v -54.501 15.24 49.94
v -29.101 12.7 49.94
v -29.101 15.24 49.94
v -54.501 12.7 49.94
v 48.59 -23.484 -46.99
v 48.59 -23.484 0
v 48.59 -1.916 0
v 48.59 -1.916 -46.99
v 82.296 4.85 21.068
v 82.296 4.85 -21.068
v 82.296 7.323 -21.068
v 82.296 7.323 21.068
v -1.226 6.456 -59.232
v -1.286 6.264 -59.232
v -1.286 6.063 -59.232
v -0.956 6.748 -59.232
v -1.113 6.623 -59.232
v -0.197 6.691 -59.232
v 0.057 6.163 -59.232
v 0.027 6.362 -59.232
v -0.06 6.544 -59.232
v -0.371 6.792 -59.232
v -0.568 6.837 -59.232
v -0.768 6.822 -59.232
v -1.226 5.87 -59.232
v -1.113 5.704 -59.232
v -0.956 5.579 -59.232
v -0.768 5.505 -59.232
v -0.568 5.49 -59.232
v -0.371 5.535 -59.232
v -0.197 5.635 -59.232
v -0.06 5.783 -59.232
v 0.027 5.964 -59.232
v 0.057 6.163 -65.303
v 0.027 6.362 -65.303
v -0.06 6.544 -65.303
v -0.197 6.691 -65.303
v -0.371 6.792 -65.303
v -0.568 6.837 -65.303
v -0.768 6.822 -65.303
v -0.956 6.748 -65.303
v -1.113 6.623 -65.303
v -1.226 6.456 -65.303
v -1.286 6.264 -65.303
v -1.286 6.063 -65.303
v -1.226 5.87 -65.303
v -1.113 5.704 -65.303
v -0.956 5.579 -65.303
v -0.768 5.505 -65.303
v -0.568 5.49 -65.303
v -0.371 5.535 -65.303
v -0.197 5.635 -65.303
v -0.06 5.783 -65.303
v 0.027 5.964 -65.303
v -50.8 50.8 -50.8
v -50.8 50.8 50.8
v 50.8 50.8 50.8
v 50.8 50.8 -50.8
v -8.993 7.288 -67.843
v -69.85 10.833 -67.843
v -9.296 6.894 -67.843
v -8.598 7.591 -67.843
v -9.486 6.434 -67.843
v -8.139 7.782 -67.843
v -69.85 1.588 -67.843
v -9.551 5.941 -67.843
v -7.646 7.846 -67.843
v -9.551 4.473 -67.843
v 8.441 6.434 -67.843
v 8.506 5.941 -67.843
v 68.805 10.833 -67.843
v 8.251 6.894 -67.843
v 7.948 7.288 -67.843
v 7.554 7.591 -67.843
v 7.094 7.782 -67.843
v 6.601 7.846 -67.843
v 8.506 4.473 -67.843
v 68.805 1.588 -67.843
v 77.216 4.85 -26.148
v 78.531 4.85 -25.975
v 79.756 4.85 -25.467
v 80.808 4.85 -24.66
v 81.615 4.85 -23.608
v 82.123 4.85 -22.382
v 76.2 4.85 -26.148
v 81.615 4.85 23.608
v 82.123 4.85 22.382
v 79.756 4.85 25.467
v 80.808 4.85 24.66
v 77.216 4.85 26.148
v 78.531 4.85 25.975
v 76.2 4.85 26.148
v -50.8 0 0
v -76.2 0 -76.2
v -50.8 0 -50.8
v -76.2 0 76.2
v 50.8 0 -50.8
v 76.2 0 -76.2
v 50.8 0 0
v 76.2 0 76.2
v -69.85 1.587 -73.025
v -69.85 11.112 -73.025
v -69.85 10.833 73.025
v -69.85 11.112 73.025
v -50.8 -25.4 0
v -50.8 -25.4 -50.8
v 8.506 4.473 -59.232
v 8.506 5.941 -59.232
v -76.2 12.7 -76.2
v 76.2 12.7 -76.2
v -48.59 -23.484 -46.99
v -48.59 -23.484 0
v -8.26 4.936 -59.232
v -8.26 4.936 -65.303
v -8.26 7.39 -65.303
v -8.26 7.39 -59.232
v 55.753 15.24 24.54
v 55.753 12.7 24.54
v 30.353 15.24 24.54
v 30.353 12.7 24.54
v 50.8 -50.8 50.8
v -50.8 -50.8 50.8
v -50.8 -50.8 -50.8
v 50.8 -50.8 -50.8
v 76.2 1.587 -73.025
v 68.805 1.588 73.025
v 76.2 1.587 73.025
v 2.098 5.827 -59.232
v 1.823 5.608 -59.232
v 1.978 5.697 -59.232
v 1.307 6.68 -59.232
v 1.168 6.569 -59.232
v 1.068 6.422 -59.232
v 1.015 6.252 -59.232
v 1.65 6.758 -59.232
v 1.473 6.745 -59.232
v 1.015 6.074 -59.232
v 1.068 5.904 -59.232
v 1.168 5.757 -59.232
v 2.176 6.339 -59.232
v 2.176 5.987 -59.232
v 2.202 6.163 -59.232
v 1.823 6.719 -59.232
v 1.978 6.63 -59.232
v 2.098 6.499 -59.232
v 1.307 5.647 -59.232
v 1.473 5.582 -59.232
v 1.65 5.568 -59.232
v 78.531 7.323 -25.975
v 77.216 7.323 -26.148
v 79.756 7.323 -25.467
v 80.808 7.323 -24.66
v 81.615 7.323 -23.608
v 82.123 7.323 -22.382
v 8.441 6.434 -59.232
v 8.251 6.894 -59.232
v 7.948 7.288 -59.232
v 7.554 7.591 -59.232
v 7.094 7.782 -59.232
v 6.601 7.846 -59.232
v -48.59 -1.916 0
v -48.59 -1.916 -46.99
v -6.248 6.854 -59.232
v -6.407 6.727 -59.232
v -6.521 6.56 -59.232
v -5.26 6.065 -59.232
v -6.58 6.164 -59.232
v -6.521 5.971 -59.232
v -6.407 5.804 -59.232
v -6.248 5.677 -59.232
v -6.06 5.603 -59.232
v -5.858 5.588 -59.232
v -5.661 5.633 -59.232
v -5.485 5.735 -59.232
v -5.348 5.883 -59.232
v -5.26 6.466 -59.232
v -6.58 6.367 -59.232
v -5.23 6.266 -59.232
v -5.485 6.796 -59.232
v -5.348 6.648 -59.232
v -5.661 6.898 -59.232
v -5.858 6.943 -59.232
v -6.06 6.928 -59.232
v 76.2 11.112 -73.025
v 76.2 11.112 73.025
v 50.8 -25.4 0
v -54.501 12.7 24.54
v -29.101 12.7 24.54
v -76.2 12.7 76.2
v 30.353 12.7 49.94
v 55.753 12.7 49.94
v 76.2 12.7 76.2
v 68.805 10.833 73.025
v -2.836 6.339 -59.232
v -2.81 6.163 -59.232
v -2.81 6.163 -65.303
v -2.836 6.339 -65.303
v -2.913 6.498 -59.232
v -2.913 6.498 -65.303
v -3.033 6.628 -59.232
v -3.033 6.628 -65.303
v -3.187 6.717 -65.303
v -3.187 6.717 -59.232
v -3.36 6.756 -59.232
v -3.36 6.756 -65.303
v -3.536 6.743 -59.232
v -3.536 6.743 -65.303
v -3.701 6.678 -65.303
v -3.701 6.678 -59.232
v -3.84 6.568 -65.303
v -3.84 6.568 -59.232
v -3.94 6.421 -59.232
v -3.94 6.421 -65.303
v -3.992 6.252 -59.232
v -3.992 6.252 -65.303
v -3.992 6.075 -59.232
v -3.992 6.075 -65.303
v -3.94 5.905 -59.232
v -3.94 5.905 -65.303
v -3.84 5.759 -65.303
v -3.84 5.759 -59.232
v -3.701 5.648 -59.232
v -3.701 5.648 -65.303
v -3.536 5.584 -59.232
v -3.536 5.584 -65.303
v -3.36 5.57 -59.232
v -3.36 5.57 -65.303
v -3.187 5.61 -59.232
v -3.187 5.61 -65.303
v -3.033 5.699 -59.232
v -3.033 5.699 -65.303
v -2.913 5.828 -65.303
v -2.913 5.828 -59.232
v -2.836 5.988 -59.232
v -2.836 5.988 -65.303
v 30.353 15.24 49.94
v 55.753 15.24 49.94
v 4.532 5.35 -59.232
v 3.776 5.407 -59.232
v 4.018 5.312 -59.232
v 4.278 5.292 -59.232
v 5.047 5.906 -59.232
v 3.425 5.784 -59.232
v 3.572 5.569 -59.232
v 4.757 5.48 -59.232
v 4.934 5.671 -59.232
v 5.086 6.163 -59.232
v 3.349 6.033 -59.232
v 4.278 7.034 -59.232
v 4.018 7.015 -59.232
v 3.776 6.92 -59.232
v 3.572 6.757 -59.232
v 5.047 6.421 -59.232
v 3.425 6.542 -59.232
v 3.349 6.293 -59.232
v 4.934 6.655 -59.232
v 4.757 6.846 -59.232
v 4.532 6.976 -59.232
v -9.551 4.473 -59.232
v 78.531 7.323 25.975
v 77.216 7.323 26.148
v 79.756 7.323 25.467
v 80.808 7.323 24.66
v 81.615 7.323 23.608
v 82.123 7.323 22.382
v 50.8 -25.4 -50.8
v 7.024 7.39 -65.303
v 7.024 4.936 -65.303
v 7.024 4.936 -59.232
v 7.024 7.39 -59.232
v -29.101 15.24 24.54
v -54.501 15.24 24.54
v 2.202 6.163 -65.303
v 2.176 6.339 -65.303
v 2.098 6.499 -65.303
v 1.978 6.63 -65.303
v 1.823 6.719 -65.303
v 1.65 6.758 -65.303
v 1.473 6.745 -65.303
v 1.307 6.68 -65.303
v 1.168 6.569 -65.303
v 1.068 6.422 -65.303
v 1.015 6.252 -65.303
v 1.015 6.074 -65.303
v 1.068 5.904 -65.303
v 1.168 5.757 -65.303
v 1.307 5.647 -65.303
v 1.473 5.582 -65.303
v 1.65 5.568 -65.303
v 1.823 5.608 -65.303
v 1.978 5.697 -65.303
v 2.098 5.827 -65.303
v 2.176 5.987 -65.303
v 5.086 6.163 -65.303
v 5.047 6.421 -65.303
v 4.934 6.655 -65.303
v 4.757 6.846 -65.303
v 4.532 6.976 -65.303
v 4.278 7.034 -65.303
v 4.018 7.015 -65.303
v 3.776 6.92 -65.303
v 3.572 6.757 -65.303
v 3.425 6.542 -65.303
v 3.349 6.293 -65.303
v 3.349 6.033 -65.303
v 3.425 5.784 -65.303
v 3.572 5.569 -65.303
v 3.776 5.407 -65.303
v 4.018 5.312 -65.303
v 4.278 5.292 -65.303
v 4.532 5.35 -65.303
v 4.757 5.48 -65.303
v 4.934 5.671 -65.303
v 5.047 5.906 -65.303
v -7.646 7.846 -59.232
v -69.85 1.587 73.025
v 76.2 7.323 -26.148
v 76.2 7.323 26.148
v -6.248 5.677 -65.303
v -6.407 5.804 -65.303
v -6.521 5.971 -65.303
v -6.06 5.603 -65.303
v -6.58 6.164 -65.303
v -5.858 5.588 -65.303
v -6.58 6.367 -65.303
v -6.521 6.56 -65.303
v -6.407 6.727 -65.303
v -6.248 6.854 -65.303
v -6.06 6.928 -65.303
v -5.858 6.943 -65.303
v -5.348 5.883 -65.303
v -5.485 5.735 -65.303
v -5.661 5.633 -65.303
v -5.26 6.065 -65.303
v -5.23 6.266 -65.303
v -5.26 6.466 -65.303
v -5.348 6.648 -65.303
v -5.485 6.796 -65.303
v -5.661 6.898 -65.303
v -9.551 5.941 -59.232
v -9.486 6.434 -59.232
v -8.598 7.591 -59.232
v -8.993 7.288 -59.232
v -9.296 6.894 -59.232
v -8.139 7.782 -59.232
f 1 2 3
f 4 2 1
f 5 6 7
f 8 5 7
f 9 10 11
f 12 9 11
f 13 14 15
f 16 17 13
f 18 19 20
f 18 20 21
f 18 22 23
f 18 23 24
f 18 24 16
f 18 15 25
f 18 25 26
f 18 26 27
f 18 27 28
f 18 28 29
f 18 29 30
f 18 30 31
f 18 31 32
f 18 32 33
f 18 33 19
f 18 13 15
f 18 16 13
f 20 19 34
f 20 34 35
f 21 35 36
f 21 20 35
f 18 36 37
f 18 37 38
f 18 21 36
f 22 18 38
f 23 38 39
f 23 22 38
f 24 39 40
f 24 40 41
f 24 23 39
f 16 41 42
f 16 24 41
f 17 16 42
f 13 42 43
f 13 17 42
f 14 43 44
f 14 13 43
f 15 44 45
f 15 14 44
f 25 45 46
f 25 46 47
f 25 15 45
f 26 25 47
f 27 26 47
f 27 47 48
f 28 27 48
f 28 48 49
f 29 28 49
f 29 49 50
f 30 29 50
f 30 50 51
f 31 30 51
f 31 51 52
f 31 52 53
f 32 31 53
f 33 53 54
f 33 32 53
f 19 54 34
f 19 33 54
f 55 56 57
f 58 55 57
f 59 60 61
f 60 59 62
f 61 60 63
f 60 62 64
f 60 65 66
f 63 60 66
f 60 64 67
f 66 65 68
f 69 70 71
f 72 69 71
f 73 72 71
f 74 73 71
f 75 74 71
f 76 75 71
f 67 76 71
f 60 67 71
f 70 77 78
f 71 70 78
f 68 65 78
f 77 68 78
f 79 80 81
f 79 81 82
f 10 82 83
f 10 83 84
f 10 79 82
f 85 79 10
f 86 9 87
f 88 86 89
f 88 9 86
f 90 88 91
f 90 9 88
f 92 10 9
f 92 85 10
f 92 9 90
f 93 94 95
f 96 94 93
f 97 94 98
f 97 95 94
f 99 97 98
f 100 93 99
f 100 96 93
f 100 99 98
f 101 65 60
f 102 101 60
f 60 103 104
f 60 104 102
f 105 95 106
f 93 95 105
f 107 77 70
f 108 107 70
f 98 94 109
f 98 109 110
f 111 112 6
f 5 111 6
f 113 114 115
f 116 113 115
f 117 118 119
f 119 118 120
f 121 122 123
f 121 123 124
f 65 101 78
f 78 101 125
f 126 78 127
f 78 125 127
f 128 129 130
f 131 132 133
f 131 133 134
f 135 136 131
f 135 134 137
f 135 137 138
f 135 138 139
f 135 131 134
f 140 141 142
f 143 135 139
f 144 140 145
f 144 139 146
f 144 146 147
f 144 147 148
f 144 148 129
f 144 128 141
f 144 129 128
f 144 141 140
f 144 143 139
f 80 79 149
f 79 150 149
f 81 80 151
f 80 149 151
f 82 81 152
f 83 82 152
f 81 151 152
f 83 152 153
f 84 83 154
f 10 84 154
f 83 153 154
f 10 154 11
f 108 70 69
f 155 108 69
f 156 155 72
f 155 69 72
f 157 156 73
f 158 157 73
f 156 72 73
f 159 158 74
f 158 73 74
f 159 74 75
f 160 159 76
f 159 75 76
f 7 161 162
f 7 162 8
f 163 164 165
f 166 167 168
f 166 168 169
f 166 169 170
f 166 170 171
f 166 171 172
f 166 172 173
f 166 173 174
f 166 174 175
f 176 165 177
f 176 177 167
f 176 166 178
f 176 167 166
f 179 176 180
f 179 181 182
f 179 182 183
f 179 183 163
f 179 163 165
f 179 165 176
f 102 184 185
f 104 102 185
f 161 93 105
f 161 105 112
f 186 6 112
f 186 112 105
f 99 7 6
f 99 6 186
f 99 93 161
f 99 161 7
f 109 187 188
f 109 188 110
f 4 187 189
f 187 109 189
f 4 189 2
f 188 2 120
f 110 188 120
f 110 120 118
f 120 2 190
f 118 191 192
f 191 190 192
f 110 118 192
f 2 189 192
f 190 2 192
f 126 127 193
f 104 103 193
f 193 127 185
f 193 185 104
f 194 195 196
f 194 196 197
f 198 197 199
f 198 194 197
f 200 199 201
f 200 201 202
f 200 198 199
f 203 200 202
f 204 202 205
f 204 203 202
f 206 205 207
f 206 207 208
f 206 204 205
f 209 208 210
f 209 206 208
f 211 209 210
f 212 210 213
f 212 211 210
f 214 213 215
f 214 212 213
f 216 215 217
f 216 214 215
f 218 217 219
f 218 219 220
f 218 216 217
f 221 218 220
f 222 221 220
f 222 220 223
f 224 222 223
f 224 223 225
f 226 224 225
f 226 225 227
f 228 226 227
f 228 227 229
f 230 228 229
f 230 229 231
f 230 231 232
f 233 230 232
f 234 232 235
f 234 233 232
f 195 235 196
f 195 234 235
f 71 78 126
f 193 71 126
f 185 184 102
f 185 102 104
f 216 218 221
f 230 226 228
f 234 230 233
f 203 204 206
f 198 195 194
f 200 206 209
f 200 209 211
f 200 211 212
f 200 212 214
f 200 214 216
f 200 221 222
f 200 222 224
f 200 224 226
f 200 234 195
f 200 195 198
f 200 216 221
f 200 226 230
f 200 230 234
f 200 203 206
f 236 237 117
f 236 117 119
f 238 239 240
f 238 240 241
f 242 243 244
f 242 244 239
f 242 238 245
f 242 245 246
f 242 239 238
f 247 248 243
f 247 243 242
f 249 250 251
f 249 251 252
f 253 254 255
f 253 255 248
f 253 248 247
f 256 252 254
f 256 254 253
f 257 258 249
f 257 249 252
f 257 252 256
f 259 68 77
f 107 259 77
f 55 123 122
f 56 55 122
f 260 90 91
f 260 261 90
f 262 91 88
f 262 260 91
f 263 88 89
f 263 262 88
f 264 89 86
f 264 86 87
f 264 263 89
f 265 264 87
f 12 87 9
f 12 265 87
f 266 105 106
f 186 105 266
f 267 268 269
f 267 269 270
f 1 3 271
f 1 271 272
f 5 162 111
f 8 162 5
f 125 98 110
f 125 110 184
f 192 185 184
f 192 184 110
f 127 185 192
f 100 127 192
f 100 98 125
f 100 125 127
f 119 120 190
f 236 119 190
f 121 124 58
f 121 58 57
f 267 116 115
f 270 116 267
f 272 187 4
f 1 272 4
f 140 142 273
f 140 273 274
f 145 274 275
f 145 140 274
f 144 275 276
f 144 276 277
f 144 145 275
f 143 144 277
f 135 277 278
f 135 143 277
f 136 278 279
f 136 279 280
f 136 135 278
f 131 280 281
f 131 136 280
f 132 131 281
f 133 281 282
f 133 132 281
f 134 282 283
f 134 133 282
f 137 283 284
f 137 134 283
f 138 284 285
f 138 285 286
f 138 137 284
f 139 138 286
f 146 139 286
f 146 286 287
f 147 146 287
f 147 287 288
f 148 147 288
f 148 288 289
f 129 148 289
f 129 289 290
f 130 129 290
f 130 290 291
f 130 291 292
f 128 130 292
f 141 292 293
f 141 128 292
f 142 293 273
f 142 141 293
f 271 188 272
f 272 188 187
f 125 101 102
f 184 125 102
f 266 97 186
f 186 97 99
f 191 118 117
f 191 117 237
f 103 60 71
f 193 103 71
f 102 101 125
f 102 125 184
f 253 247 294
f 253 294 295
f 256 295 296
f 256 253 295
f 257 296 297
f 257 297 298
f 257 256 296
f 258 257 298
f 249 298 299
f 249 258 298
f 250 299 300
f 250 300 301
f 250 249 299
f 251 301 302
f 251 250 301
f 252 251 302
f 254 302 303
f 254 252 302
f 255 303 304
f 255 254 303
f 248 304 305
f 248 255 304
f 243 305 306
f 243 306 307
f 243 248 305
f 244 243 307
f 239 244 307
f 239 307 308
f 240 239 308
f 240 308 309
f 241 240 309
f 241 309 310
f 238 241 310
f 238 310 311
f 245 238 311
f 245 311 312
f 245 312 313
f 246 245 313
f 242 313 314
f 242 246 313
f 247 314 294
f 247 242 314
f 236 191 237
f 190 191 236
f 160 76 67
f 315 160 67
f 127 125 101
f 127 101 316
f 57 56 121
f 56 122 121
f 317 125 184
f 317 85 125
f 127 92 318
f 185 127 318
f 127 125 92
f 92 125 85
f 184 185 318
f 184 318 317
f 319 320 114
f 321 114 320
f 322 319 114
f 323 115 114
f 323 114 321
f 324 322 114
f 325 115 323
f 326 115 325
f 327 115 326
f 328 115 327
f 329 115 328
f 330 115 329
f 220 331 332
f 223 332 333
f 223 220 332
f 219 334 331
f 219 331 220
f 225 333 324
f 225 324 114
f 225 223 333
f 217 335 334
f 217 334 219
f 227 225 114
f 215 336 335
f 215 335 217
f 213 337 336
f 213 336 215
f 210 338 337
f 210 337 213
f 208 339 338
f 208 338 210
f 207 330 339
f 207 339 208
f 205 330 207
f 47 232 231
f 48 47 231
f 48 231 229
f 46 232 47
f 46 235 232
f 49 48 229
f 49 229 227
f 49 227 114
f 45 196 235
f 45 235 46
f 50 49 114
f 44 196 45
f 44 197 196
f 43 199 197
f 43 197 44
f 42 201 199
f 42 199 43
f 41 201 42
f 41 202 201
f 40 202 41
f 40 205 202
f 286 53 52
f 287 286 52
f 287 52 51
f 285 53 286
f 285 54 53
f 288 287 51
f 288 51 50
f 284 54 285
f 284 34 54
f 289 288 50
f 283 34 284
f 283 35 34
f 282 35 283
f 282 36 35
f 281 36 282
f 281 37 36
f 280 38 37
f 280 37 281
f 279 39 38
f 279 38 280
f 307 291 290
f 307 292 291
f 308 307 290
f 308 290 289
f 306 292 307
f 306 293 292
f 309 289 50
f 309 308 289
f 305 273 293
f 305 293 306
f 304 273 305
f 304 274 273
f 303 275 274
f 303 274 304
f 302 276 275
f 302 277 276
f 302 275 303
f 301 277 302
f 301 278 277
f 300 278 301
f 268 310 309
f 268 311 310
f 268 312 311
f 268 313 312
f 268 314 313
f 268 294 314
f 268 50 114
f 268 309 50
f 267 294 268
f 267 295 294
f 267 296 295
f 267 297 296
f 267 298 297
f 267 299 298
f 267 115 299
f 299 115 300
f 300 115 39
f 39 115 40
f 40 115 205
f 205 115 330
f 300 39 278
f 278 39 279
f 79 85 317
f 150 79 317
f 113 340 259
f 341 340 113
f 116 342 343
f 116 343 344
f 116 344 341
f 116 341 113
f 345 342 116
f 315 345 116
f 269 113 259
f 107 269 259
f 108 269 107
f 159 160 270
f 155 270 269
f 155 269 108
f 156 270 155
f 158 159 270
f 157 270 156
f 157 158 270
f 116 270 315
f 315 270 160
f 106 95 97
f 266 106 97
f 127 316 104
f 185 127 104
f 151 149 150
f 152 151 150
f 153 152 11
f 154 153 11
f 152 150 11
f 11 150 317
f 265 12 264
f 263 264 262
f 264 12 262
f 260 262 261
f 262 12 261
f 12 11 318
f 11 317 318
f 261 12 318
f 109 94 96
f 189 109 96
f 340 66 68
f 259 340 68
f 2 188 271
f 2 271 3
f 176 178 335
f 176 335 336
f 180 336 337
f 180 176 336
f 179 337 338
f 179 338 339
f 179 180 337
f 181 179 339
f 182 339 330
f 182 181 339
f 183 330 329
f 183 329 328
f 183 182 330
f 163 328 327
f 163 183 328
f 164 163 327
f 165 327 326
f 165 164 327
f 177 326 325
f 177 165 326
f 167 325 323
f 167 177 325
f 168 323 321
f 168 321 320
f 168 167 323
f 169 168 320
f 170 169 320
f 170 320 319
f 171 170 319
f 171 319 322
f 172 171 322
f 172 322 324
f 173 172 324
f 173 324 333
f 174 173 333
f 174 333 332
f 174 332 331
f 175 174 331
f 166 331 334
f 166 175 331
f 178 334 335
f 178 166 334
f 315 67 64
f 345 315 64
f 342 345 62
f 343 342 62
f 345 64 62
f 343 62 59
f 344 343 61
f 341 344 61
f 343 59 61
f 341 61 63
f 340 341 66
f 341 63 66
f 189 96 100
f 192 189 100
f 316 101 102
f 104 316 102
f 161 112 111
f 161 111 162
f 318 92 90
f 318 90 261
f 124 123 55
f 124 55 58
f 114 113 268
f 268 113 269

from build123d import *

# Parameters (mm, degrees)
F1_W      = 152.4
F1_H      = 152.4
F2_DEPTH  = 12.7
F3_W      = 25.4
F3_H      = 25.4
F4_DEPTH  = 2.54
F6_W      = 9.525
F6_H      = 146.05
F6_W_2    = 7.9
F6_H_2    = 142.3924
F7_DEPTH  = 146.05
F8_W      = 101.6
F8_H      = 50.8
F9_DEPTH  = 25.4
F10_W     = 97.179114
F10_H     = 21.567774
F11_DEPTH = 46.99
F12_DEPTH = 146.05
F13_W     = 138.655322
F13_H     = 140.86758
F14_DEPTH = 9.2456
F16_DEPTH = 8.6106
F17_W     = 15.284132
F17_H     = 2.453639
F17_R     = 0.679113
F17_R_2   = 0.594481
F17_R_3   = 0.675254
F17_R_4   = 0.596675
F17_R_5   = 0.873496
F18_DEPTH = 6.0706
F19_W     = 2.473427
F19_H     = 52.295324
F20_DEPTH = 6.096
F21_R     = 5.08
F22_W     = 101.6
F22_H     = 101.6
F23_DEPTH = 50.8


with BuildPart() as f2:
    # F1 (on Front) → F2 (new body)
    with BuildSketch(Plane.XZ):
        Rectangle(F1_W, F1_H)
    extrude(amount=-F2_DEPTH)

    # F3 (on face) → F4 (join)
    with BuildSketch(Plane(origin=(0, 12.7, 0), x_dir=(-1, 0, 0), z_dir=(0, 1, 0))):
        with Locations((-43.053001, 37.239678)):
            Rectangle(F3_W, F3_H)
        with Locations((41.80052, 37.239678)):
            Rectangle(F3_W, F3_H)
    extrude(amount=F4_DEPTH)

    # F6 (on face) → F7 (cut)
    with BuildSketch(Plane.YZ.offset(76.2)):
        with Locations((6.35, 0)):
            Rectangle(F6_W, F6_H)
        with Locations((6.35, 0)):
            Rectangle(F6_W_2, F6_H_2, mode=Mode.SUBTRACT)
        with Locations((6.35, 0)):
            Rectangle(F6_W_2, F6_H_2)
    extrude(amount=-F7_DEPTH, mode=Mode.SUBTRACT)

    # F8 (on face) → F9 (join)
    with BuildSketch(Plane.XZ):
        with Locations((0, -25.4)):
            Rectangle(F8_W, F8_H)
    extrude(amount=F9_DEPTH)

    # F10 (on face) → F11 (cut)
    with BuildSketch(Plane.XY):
        with Locations((0, -12.7)):
            Rectangle(F10_W, F10_H)
    extrude(amount=-F11_DEPTH, mode=Mode.SUBTRACT)


with BuildPart() as f12:
    # F6 (on face) → F12 (new body)
    with BuildSketch(Plane.YZ.offset(76.2)):
        with Locations((6.35, 0)):
            Rectangle(F6_W, F6_H)
        with Locations((6.35, 0)):
            Rectangle(F6_W_2, F6_H_2, mode=Mode.SUBTRACT)
        with Locations((6.35, 0)):
            Rectangle(F6_W_2, F6_H_2)
    extrude(amount=-F12_DEPTH)

    # F13 (on face) → F14 (cut)
    with BuildSketch(Plane.XZ.offset(-1.5875)):
        with Locations((-0.522339, 2.59121)):
            Rectangle(F13_W, F13_H)
    extrude(amount=-F14_DEPTH, mode=Mode.SUBTRACT)

    # F15 (on face) → F16 (join)
    with BuildSketch(Plane.XY.offset(-67.84258)):
        with BuildLine():
            Line((6.601052, 7.846441), (-7.64573, 7.846441))
            ThreePointArc((-7.64573, 7.846441), (-8.992768, 7.288479), (-9.55073, 5.941441))
            Line((-9.55073, 5.941441), (-9.55073, 4.472558))
            Line((-9.55073, 4.472558), (8.506052, 4.472558))
            Line((8.506052, 4.472558), (8.506052, 5.941441))
            ThreePointArc((8.506052, 5.941441), (7.94809, 7.288479), (6.601052, 7.846441))
        make_face()
    extrude(amount=F16_DEPTH)

    # F17 (on face) → F18 (cut)
    with BuildSketch(Plane.XY.offset(-59.23198)):
        with Locations((-0.618114, 6.163291)):
            Rectangle(F17_W, F17_H)
        with Locations((-5.908775, 6.265525)):
            Circle(F17_R, mode=Mode.SUBTRACT)
        with Locations((-3.404018, 6.16329)):
            Circle(F17_R_2, mode=Mode.SUBTRACT)
        with Locations((-0.618114, 6.16329)):
            Circle(F17_R_3, mode=Mode.SUBTRACT)
        with Locations((1.605497, 6.16329)):
            Circle(F17_R_4, mode=Mode.SUBTRACT)
        with Locations((4.212489, 6.16329)):
            Circle(F17_R_5, mode=Mode.SUBTRACT)
    extrude(amount=-F18_DEPTH, mode=Mode.SUBTRACT)

    # F19 (on face) → F20 (join)
    with BuildSketch(Plane.YZ.offset(76.2)):
        with Locations((6.08627, 0)):
            Rectangle(F19_W, F19_H)
    extrude(amount=F20_DEPTH)

    # F21
    f21_edges = [f12.edges().sort_by_distance(p)[0] for p in [
        (82.296, 6.08627, 26.147662),
        (82.296, 6.08627, -26.147662),
    ]]
    fillet(f21_edges, radius=F21_R)


with BuildPart() as f23:
    # F22 (on Front) → F23 (new body, symmetric)
    with BuildSketch(Plane.XZ):
        Rectangle(F22_W, F22_H)
    extrude(amount=F23_DEPTH, both=True)


solid = Compound([f2.part, f12.part, f23.part])
